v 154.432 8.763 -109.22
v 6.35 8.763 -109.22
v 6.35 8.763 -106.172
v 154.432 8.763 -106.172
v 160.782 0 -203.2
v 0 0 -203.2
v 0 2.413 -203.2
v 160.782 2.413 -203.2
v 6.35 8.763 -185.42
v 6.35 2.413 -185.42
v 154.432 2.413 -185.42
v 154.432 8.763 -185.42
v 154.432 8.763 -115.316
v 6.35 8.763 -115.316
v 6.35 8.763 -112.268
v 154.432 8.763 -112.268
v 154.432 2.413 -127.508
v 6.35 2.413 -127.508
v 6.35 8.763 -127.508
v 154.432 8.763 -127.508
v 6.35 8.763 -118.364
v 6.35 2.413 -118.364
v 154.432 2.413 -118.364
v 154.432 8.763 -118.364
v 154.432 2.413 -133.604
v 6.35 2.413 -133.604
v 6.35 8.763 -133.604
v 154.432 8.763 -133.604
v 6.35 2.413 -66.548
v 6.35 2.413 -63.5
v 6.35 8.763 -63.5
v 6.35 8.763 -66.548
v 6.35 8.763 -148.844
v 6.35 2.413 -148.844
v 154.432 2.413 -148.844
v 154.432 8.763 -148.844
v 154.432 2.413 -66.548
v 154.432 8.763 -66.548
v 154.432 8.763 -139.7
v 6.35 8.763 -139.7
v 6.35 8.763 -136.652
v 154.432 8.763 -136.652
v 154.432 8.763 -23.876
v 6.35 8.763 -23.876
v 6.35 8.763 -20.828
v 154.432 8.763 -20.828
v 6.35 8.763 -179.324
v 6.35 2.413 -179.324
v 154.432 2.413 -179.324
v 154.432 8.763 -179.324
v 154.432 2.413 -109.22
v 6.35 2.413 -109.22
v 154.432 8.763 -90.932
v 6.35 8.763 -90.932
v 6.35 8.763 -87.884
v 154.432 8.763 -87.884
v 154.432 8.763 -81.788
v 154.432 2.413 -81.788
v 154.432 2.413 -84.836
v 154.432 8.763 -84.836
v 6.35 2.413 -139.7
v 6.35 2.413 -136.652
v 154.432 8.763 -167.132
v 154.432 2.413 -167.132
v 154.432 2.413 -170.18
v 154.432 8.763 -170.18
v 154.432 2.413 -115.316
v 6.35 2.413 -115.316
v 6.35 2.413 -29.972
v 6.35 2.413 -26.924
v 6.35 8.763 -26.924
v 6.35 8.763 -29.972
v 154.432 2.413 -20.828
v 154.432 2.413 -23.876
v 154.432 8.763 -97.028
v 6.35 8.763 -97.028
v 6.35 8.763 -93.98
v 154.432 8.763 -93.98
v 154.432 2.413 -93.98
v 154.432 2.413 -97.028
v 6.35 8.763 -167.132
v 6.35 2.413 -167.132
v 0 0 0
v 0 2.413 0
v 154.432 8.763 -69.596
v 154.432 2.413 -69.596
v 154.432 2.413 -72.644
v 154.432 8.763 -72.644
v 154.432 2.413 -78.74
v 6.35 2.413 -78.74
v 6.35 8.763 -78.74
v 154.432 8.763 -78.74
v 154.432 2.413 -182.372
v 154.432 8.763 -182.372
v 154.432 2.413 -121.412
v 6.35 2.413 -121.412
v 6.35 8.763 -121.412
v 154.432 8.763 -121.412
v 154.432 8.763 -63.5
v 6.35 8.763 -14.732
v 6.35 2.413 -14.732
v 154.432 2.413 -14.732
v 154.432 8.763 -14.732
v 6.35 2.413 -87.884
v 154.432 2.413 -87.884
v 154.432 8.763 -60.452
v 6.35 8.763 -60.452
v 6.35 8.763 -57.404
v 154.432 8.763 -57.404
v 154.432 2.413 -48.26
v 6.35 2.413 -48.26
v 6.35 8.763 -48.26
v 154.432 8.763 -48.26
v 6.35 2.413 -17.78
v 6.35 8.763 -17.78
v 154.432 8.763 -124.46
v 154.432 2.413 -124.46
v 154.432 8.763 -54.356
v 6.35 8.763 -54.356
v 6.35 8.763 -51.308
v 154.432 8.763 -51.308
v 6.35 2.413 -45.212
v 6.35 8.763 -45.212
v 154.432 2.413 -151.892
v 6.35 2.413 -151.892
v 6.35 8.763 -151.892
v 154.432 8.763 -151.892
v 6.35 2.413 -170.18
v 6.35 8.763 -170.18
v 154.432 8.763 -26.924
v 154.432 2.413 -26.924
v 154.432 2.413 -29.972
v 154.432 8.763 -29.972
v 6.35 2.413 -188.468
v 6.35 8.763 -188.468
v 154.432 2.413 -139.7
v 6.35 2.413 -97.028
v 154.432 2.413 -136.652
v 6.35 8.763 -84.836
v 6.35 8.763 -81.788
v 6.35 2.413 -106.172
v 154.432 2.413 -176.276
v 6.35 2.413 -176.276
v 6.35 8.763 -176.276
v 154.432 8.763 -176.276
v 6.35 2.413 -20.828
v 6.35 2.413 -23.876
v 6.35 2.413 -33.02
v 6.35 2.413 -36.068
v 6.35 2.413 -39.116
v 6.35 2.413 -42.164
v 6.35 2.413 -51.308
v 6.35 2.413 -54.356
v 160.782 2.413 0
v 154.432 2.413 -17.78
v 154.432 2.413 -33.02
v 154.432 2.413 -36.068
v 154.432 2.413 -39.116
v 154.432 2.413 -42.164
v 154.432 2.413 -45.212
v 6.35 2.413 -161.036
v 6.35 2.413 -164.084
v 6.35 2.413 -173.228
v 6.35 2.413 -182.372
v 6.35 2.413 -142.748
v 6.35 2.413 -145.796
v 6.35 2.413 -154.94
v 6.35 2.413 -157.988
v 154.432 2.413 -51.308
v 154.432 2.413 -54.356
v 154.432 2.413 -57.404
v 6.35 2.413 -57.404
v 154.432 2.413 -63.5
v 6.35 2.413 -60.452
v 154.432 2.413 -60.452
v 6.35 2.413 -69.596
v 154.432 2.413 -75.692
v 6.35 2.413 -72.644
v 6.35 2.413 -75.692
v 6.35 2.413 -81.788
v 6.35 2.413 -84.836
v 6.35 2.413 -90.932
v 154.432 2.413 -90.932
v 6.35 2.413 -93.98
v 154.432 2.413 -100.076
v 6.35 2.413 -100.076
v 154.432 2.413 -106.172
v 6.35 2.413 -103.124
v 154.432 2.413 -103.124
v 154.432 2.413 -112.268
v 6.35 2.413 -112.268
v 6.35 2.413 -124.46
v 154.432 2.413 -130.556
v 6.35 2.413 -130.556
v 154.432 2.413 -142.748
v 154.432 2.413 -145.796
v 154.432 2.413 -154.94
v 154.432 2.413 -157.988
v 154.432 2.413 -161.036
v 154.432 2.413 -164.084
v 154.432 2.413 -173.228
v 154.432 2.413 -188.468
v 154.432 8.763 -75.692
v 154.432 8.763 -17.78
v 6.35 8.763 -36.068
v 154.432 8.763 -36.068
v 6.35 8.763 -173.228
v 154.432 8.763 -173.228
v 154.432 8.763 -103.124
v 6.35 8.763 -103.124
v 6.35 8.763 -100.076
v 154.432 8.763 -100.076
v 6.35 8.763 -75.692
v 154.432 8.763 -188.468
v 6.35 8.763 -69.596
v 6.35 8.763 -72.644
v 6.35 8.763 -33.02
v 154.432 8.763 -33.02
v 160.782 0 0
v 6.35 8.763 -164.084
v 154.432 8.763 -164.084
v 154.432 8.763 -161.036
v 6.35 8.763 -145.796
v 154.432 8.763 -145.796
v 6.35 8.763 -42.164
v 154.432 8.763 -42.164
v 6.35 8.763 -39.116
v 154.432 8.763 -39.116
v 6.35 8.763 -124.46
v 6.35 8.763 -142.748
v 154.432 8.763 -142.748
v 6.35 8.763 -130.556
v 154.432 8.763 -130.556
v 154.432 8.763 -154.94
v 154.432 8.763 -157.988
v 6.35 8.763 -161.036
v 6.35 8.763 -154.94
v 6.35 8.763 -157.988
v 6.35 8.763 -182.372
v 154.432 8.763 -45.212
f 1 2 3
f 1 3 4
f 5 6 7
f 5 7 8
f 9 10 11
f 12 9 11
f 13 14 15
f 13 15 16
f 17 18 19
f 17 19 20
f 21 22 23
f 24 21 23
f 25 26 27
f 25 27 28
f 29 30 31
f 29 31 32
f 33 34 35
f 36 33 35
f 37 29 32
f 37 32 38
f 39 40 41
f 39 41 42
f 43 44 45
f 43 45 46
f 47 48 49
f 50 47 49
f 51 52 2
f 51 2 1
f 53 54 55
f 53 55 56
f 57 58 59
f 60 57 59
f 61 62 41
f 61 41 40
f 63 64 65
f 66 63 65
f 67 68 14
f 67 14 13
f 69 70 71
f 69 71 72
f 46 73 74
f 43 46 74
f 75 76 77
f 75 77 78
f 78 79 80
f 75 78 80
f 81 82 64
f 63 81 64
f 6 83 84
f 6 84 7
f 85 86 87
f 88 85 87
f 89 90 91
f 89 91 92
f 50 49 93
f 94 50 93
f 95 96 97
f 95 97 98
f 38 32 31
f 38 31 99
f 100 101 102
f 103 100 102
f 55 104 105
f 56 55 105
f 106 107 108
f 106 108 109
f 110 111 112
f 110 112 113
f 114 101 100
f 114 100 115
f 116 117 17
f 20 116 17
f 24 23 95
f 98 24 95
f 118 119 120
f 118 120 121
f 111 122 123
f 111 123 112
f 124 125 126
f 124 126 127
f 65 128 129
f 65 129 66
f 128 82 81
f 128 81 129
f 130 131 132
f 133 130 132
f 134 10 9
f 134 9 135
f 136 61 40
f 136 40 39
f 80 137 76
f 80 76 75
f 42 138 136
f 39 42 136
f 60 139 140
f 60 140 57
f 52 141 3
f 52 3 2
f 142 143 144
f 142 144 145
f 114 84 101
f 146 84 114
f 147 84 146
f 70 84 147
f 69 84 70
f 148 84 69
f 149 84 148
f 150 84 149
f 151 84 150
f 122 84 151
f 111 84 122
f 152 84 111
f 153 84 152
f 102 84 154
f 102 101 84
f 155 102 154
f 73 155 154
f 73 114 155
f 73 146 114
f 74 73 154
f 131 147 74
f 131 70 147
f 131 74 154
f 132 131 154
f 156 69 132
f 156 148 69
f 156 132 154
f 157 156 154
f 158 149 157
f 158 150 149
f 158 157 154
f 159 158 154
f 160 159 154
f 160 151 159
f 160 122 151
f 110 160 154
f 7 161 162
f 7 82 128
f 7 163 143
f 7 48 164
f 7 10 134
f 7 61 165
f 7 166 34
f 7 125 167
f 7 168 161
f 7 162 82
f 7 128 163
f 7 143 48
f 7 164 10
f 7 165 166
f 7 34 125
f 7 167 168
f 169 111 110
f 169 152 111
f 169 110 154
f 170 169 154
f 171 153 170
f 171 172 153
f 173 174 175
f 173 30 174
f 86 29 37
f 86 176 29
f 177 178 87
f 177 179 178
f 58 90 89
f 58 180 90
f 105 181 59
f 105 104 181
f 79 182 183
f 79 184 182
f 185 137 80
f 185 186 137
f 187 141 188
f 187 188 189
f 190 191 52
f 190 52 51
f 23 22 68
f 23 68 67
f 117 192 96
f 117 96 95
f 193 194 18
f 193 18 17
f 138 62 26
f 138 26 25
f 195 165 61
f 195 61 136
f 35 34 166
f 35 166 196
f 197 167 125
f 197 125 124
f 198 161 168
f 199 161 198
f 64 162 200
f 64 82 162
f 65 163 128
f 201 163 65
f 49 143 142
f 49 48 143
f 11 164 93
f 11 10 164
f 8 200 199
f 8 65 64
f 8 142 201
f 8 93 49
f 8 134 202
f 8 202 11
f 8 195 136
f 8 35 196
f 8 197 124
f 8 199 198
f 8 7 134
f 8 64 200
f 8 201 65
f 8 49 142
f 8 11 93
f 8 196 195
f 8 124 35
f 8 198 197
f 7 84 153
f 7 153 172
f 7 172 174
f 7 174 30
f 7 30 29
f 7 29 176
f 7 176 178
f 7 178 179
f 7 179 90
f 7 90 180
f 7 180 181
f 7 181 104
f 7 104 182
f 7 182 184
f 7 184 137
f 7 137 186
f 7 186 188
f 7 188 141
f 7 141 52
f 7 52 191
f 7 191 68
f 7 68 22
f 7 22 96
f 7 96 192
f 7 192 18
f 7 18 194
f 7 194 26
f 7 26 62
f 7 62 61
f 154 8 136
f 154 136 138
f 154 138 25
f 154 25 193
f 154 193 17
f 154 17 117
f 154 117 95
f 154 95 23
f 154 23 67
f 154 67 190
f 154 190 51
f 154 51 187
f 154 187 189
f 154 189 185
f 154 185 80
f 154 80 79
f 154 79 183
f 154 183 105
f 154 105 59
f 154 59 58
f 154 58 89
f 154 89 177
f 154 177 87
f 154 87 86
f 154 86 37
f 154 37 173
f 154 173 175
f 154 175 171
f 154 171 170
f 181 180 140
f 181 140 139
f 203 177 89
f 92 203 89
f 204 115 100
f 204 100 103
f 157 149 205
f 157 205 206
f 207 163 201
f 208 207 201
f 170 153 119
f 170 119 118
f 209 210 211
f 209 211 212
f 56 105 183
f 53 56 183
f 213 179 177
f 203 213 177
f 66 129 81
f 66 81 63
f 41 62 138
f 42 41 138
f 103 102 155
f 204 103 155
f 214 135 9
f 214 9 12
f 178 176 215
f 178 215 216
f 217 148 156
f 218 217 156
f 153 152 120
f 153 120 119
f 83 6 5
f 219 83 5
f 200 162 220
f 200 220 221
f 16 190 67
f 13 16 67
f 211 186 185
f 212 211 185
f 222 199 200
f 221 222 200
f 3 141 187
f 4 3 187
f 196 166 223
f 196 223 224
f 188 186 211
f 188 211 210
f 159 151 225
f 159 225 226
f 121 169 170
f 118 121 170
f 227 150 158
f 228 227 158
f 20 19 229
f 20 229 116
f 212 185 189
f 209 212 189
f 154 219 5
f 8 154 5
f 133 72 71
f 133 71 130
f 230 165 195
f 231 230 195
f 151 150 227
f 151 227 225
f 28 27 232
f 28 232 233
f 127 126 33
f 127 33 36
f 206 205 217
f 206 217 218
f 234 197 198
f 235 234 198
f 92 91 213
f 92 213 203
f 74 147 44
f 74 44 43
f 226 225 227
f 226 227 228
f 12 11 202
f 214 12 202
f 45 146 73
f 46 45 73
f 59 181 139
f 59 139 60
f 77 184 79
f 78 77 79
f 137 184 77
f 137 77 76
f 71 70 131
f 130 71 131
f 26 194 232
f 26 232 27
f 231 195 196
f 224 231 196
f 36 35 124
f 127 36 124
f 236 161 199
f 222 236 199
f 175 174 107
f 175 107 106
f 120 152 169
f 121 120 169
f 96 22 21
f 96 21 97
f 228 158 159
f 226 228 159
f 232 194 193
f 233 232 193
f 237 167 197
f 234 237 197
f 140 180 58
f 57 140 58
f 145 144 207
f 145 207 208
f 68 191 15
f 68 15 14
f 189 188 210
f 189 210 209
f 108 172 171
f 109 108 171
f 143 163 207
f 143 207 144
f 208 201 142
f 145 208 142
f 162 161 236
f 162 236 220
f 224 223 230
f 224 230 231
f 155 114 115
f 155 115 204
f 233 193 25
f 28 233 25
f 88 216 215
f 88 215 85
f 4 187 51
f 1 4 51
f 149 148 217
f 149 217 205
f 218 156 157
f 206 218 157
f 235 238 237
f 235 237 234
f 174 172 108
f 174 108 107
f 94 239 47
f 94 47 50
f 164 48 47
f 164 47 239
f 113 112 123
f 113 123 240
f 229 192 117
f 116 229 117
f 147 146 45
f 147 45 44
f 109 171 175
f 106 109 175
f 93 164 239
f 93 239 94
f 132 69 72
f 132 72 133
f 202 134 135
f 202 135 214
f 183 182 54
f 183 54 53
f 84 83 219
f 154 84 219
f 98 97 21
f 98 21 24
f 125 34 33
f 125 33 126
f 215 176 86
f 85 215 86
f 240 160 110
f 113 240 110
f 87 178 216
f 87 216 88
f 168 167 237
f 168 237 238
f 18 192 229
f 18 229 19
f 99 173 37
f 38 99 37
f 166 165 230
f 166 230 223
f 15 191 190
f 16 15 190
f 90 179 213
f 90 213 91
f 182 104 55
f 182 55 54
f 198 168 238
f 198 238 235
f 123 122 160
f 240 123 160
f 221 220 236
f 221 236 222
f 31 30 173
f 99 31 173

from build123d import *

# Parameters (mm, degrees)
SKETCH1_W           = 160.782
SKETCH1_H           = 203.2
BOSS_EXTRUDE1_DEPTH = 2.413
SKETCH2_W           = 148.082
SKETCH2_H           = 3.048
BOSS_EXTRUDE2_DEPTH = 6.35


with BuildPart() as part:
    # Sketch1 → Boss-Extrude1 (new body)
    with BuildSketch(Plane(origin=(0, 0, 0), x_dir=(1, 0, 0), z_dir=(0, 1, 0))):
        with Locations((80.391, 101.6)):
            Rectangle(SKETCH1_W, SKETCH1_H)
    extrude(amount=BOSS_EXTRUDE1_DEPTH)

    # Sketch2 → Boss-Extrude2 (add)
    with BuildSketch(Plane(origin=(0, 2.413, 0), x_dir=(1, 0, 0), z_dir=(0, 1, 0))):
        with Locations((80.391, 180.848)):
            Rectangle(SKETCH2_W, SKETCH2_H)
        with Locations((80.391, 186.944)):
            Rectangle(SKETCH2_W, SKETCH2_H)
        with Locations((80.391, 174.752)):
            Rectangle(SKETCH2_W, SKETCH2_H)
        with Locations((80.391, 168.656)):
            Rectangle(SKETCH2_W, SKETCH2_H)
        with Locations((80.391, 162.56)):
            Rectangle(SKETCH2_W, SKETCH2_H)
        with Locations((80.391, 156.464)):
            Rectangle(SKETCH2_W, SKETCH2_H)
        with Locations((80.391, 150.368)):
            Rectangle(SKETCH2_W, SKETCH2_H)
        with Locations((80.391, 144.272)):
            Rectangle(SKETCH2_W, SKETCH2_H)
        with Locations((80.391, 138.176)):
            Rectangle(SKETCH2_W, SKETCH2_H)
        with Locations((80.391, 132.08)):
            Rectangle(SKETCH2_W, SKETCH2_H)
        with Locations((80.391, 125.984)):
            Rectangle(SKETCH2_W, SKETCH2_H)
        with Locations((80.391, 119.888)):
            Rectangle(SKETCH2_W, SKETCH2_H)
        with Locations((80.391, 113.792)):
            Rectangle(SKETCH2_W, SKETCH2_H)
        with Locations((80.391, 107.696)):
            Rectangle(SKETCH2_W, SKETCH2_H)
        with Locations((80.391, 101.6)):
            Rectangle(SKETCH2_W, SKETCH2_H)
        with Locations((80.391, 95.504)):
            Rectangle(SKETCH2_W, SKETCH2_H)
        with Locations((80.391, 89.408)):
            Rectangle(SKETCH2_W, SKETCH2_H)
        with Locations((80.391, 83.312)):
            Rectangle(SKETCH2_W, SKETCH2_H)
        with Locations((80.391, 77.216)):
            Rectangle(SKETCH2_W, SKETCH2_H)
        with Locations((80.391, 71.12)):
            Rectangle(SKETCH2_W, SKETCH2_H)
        with Locations((80.391, 65.024)):
            Rectangle(SKETCH2_W, SKETCH2_H)
        with Locations((80.391, 58.928)):
            Rectangle(SKETCH2_W, SKETCH2_H)
        with Locations((80.391, 52.832)):
            Rectangle(SKETCH2_W, SKETCH2_H)
        with Locations((80.391, 46.736)):
            Rectangle(SKETCH2_W, SKETCH2_H)
        with Locations((80.391, 40.64)):
            Rectangle(SKETCH2_W, SKETCH2_H)
        with Locations((80.391, 34.544)):
            Rectangle(SKETCH2_W, SKETCH2_H)
        with Locations((80.391, 28.448)):
            Rectangle(SKETCH2_W, SKETCH2_H)
        with Locations((80.391, 22.352)):
            Rectangle(SKETCH2_W, SKETCH2_H)
        with Locations((80.391, 16.256)):
            Rectangle(SKETCH2_W, SKETCH2_H)
    extrude(amount=BOSS_EXTRUDE2_DEPTH)


solid = part.part
